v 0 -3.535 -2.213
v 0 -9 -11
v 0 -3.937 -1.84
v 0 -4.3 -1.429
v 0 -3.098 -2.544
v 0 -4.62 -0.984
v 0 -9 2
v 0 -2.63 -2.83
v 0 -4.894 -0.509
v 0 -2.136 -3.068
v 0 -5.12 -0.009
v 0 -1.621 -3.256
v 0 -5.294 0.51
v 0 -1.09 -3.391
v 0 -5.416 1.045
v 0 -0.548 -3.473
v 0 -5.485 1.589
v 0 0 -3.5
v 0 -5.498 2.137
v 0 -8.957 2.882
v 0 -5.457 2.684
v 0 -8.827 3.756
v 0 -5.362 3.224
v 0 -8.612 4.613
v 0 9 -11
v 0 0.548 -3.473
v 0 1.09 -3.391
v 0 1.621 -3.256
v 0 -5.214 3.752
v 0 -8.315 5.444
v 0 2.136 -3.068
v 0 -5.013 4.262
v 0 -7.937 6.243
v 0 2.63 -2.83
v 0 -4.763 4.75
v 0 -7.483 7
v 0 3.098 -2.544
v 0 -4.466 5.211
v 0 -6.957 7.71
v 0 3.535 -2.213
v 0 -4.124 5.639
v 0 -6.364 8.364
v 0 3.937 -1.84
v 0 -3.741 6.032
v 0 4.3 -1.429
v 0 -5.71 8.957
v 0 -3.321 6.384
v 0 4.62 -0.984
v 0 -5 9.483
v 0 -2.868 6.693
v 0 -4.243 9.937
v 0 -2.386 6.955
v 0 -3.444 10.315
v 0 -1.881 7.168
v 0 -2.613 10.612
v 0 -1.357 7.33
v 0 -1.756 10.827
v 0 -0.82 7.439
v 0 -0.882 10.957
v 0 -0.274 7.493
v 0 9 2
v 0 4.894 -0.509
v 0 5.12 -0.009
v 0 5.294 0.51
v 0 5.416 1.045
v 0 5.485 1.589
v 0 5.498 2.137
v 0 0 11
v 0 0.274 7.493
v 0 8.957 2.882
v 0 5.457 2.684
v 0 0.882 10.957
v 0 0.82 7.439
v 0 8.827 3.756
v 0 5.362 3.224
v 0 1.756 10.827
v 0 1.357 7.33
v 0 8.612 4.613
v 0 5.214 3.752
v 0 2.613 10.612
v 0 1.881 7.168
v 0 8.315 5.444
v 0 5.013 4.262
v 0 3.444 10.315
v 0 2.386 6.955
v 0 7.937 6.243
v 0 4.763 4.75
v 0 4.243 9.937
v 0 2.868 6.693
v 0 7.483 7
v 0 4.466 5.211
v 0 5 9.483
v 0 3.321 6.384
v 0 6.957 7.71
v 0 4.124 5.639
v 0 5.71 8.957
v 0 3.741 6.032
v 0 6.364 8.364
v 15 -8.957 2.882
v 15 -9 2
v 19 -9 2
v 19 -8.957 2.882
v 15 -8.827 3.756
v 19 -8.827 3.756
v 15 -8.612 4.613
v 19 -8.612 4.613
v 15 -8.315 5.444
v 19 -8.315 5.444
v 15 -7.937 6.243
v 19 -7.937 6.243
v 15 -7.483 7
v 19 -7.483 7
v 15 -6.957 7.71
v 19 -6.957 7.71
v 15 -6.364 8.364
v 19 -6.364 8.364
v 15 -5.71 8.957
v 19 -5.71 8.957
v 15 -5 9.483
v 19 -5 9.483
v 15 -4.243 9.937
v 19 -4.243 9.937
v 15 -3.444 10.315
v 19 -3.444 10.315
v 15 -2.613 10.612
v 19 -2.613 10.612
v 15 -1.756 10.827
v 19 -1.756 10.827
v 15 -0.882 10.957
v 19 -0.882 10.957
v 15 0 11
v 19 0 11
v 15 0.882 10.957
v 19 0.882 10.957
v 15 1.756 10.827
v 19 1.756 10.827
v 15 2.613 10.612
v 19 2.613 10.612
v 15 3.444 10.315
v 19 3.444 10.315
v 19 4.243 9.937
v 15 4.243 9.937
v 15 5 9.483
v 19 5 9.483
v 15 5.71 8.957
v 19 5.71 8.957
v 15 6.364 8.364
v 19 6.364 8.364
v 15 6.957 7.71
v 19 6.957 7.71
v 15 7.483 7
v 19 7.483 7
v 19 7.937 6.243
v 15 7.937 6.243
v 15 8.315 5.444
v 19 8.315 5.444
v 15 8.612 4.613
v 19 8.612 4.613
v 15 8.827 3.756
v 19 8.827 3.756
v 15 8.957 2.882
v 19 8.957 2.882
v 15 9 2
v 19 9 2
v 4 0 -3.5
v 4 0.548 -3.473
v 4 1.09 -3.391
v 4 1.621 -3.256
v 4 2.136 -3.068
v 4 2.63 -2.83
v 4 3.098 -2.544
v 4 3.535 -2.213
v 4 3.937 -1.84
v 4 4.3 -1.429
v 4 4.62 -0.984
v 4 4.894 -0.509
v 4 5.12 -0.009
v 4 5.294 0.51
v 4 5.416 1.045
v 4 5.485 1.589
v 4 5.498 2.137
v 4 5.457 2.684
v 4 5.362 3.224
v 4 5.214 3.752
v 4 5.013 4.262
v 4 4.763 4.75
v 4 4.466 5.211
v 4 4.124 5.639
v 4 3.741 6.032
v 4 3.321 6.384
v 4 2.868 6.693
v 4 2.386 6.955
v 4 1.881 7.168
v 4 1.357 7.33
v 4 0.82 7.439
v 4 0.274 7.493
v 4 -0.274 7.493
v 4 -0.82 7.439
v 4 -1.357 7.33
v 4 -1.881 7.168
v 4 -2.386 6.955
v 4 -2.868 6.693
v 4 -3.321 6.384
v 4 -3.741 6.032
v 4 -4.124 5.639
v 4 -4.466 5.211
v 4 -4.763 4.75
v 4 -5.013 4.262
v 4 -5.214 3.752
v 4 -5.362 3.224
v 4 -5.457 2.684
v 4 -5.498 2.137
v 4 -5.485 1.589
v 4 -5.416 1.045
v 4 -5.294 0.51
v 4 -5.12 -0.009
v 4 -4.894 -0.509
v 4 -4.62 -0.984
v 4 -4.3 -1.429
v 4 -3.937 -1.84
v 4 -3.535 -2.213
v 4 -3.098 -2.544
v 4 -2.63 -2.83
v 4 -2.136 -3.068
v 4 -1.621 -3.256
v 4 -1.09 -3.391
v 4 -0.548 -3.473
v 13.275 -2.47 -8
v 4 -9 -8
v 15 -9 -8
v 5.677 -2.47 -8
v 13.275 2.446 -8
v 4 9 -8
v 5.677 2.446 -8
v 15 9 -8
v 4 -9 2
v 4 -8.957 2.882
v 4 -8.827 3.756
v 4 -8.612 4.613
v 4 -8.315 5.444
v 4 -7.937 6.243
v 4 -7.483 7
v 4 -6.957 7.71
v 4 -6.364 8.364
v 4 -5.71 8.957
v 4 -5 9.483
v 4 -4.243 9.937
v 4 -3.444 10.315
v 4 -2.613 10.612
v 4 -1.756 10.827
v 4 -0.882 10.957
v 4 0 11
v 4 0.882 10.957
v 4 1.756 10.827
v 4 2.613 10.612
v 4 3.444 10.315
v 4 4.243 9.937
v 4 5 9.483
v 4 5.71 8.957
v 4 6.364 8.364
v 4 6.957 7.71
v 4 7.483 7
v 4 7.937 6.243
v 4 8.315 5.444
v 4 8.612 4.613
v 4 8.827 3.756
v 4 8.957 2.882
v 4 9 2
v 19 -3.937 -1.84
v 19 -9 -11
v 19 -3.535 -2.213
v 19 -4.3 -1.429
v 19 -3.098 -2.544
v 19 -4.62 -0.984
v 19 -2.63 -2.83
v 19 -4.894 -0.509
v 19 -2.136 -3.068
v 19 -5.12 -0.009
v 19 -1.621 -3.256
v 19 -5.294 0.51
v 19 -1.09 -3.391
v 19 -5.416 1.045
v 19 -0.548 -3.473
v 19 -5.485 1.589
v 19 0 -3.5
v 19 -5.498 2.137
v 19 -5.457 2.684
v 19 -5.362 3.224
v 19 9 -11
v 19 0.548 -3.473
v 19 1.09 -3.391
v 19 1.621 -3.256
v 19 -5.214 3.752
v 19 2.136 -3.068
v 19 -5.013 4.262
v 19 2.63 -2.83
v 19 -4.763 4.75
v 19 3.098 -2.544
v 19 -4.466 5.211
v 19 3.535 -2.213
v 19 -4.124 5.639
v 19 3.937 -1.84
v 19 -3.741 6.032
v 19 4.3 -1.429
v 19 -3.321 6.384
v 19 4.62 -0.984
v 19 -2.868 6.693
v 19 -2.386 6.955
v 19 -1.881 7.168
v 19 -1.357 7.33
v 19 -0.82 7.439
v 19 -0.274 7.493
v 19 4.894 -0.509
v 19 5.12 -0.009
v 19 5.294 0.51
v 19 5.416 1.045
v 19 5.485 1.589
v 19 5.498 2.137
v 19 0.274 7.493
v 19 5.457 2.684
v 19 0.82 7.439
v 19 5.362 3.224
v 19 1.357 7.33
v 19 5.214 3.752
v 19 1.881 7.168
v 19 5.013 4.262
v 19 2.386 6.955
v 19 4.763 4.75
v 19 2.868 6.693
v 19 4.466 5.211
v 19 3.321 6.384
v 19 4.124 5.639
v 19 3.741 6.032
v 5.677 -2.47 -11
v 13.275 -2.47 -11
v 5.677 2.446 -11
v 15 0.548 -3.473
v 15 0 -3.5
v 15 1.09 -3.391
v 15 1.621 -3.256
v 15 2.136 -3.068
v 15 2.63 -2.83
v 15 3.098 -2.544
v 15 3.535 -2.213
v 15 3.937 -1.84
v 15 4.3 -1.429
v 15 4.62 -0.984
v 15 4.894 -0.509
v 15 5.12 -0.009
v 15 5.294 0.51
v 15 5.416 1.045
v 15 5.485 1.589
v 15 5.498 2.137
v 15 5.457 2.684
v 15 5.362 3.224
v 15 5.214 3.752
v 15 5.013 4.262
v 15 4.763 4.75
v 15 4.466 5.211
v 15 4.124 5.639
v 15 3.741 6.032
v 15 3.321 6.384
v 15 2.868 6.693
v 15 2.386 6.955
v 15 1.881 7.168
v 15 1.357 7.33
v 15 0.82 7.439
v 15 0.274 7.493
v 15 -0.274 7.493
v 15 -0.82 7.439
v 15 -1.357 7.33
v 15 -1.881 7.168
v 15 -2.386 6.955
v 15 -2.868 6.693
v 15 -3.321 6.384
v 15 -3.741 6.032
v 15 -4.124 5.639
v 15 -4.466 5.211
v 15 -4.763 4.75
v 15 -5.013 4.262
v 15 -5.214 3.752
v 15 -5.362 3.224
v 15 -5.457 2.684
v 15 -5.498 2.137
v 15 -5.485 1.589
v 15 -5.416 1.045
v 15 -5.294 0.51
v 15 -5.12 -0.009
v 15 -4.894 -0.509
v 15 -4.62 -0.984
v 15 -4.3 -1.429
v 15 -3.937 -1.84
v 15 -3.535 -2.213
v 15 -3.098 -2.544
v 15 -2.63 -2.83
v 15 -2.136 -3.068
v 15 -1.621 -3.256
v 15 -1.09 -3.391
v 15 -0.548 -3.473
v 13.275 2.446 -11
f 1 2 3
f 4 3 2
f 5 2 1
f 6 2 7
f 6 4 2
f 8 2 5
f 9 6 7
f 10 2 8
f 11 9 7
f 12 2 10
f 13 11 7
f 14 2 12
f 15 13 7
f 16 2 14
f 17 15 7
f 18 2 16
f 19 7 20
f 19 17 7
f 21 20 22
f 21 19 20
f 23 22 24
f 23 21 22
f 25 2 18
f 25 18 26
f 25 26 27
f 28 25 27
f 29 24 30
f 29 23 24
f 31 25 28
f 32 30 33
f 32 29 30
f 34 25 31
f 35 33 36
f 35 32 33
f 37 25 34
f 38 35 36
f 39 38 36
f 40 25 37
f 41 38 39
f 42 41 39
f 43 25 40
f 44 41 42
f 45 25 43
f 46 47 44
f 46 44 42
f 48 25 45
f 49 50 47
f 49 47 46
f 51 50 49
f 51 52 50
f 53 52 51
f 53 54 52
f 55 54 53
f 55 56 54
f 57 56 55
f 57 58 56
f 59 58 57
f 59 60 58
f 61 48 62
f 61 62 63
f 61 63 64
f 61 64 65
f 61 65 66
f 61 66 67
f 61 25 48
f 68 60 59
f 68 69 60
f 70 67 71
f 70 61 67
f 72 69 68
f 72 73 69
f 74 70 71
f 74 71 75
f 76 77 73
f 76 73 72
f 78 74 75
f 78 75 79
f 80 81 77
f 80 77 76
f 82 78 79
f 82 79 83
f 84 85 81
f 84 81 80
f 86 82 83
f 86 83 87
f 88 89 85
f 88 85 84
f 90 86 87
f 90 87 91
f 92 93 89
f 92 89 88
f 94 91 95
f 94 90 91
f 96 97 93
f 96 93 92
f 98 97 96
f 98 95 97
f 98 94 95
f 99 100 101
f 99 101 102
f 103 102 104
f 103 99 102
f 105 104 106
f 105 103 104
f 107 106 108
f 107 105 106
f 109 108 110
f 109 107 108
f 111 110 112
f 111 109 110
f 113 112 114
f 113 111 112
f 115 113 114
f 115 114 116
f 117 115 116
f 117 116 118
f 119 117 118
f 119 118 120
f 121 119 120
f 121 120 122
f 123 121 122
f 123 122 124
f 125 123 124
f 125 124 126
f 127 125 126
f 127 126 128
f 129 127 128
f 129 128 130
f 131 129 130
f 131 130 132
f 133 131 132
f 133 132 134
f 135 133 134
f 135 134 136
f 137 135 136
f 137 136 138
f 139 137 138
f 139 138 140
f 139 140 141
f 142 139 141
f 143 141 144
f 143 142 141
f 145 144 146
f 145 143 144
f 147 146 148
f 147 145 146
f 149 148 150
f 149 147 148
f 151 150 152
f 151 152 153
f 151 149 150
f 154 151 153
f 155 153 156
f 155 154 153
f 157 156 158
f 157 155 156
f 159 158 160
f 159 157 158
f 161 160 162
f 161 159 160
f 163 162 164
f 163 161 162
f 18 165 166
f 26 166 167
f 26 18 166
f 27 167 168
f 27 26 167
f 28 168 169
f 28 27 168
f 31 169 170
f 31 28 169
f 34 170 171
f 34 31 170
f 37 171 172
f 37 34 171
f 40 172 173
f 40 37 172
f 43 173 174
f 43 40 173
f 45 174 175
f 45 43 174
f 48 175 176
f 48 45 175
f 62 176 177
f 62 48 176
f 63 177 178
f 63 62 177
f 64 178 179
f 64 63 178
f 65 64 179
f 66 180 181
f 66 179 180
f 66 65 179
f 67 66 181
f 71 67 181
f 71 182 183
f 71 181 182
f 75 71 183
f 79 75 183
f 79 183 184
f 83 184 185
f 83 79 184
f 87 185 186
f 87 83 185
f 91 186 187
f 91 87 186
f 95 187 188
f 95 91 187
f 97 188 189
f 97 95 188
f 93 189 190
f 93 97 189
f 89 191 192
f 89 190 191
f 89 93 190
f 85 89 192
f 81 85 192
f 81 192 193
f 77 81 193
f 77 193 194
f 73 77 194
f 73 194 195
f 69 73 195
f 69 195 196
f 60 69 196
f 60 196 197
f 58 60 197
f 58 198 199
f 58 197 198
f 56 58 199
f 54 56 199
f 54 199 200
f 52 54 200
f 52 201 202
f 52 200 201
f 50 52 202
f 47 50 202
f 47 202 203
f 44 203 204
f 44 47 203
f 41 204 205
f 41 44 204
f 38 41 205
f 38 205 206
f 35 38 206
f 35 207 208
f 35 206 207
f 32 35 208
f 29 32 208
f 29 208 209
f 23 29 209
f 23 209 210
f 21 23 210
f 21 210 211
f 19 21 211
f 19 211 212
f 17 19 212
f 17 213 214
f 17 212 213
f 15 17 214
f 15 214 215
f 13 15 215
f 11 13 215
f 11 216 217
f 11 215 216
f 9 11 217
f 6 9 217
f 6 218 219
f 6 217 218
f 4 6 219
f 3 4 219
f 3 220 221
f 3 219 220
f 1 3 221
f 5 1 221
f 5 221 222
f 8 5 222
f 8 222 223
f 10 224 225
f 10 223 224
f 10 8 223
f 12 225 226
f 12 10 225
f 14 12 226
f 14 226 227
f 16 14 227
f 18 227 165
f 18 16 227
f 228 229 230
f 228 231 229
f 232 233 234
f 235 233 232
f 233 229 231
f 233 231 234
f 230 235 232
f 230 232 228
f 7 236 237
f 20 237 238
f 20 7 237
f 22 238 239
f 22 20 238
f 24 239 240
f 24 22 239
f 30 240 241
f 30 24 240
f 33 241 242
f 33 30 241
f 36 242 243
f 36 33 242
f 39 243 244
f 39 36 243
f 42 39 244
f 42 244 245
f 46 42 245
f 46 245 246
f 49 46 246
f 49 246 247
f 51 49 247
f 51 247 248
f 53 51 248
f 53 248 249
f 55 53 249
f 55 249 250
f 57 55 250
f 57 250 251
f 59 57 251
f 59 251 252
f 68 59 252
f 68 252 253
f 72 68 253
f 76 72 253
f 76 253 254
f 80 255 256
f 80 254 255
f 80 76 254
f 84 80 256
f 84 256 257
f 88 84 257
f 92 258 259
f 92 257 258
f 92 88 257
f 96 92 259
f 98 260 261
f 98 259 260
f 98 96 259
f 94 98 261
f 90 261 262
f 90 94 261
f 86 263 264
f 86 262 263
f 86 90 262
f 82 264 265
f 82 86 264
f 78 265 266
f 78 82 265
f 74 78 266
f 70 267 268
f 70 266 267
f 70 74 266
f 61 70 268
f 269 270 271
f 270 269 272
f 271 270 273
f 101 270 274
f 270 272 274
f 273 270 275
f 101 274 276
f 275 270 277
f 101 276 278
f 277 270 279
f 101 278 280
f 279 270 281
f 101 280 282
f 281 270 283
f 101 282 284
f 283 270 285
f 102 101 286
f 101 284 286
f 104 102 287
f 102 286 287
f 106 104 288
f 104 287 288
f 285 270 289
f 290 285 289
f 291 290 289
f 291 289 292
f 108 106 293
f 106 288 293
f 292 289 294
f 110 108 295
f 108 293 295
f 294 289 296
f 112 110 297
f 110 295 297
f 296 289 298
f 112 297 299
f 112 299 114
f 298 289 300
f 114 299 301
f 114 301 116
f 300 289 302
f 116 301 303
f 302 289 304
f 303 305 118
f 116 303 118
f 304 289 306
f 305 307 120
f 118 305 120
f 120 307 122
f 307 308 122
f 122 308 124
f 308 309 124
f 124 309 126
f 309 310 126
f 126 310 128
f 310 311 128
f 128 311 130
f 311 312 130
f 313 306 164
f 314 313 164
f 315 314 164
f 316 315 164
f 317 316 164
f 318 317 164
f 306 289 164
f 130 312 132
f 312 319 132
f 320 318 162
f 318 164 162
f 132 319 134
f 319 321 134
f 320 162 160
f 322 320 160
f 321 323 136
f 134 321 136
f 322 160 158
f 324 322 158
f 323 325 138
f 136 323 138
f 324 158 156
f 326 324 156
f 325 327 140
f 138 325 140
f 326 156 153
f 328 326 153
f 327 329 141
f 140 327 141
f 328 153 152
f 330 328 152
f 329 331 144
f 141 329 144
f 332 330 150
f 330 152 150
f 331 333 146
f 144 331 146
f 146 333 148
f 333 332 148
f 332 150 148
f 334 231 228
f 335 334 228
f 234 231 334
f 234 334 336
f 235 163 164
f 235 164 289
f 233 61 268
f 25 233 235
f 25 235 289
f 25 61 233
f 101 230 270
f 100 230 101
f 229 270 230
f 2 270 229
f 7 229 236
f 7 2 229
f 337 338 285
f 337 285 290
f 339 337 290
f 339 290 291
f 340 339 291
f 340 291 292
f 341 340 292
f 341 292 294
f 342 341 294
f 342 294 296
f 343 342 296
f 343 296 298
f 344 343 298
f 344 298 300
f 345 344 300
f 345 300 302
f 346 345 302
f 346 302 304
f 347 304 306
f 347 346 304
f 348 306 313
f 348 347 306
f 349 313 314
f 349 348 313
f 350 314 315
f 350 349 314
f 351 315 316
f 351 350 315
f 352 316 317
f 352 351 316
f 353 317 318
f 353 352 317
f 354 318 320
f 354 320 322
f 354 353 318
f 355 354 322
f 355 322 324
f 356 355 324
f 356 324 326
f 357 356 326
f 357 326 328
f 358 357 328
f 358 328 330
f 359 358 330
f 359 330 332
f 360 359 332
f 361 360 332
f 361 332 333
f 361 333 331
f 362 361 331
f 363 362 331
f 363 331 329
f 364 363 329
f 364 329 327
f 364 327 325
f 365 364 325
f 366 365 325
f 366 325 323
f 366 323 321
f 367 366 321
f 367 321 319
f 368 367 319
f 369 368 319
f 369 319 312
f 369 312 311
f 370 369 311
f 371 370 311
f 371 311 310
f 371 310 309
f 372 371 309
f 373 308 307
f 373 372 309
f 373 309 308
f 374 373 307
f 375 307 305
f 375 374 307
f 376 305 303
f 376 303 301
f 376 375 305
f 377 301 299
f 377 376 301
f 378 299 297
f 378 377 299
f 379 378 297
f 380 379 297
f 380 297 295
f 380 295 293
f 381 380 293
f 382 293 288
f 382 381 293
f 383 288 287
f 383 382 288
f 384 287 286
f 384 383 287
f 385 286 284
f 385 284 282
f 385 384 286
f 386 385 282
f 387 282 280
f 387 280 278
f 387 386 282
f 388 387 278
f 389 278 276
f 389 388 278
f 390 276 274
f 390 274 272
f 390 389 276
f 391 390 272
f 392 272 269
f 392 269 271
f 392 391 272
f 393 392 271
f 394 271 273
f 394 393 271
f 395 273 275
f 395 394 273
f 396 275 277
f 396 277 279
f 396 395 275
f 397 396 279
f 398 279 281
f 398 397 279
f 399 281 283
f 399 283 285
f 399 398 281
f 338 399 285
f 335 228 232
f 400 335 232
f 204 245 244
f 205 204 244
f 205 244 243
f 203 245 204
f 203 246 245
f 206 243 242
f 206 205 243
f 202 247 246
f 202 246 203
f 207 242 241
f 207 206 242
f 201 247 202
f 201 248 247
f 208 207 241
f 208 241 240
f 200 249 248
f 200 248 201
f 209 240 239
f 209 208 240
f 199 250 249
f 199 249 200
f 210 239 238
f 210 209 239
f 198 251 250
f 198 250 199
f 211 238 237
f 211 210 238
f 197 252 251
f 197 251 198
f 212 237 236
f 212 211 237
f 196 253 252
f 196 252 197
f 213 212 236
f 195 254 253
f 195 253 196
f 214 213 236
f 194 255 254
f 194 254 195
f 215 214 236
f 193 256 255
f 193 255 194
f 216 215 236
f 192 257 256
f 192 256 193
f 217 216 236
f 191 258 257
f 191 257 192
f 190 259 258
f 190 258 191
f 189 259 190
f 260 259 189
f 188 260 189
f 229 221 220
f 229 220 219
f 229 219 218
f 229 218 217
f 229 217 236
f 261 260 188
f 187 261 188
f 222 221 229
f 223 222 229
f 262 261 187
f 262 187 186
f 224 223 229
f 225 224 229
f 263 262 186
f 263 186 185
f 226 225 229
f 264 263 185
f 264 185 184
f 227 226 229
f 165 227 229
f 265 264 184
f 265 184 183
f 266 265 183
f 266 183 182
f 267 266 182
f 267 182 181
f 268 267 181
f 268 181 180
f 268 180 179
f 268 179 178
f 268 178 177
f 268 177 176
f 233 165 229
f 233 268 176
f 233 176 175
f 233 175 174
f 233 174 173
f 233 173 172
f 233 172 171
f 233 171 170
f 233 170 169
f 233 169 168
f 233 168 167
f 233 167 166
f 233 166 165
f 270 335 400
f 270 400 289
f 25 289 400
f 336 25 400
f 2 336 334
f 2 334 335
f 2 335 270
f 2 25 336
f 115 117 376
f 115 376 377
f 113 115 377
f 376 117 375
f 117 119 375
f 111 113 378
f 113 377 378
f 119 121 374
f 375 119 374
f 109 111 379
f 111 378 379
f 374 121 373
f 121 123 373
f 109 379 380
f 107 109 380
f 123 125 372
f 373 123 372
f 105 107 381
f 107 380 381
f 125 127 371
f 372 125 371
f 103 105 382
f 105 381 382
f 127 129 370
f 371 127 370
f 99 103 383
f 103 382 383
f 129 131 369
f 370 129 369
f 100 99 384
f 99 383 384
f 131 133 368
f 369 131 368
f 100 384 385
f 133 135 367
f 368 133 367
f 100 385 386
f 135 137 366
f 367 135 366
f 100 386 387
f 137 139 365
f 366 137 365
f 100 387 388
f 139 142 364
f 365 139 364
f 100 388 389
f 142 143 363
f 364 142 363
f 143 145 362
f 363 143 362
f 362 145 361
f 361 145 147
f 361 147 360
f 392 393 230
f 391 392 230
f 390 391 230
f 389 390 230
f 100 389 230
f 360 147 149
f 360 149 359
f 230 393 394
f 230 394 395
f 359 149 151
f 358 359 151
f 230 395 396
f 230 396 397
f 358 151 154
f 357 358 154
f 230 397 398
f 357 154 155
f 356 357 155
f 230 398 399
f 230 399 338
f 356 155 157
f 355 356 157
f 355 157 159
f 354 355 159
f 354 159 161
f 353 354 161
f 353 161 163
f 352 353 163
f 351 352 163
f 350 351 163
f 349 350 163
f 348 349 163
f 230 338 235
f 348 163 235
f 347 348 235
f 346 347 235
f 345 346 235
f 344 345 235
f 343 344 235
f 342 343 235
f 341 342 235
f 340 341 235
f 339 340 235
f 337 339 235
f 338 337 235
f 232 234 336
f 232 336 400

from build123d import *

# Parameters (mm, degrees)
SKETCH1_R           = 5.499999036
BOSS_EXTRUDE1_DEPTH = 19
SKETCH2_W           = 11
SKETCH2_H           = 19
CUT_EXTRUDE1_DEPTH  = 33
SKETCH3_W           = 7.598245287
SKETCH3_H           = 4.916511656
CUT_EXTRUDE2_DEPTH  = 33


with BuildPart() as part:
    # Sketch1 → Boss-Extrude1 (new body)
    with BuildSketch(Plane(origin=(0, 0, 0), x_dir=(0, 0, -1), z_dir=(1, 0, 0))):
        with BuildLine():
            Line((-1.999999523, 9.000000954), (11.000000477, 9.000000954))
            Line((11.000000477, 9.000000954), (11.000000477, -9.000000954))
            Line((11.000000477, -9.000000954), (-1.999999523, -9.000000954))
            ThreePointArc((-1.999999523, -9.000000954), (-11.000000477, 0), (-1.999999523, 9.000000954))
        make_face()
        with Locations((-1.999999523, 0)):
            Circle(SKETCH1_R, mode=Mode.SUBTRACT)
    extrude(amount=BOSS_EXTRUDE1_DEPTH)

    # Sketch2 → Cut-Extrude1 (cut)
    with BuildSketch(Plane(origin=(0, 9.000000954, 0), x_dir=(1, 0, 0), z_dir=(0, 1, 0))):
        with Locations((9.5, -1.500000477)):
            Rectangle(SKETCH2_W, SKETCH2_H)
    extrude(amount=-CUT_EXTRUDE1_DEPTH, mode=Mode.SUBTRACT)

    # Sketch3 → Cut-Extrude2 (cut)
    with BuildSketch(Plane.XY.offset(-7.999999523)):
        with Locations((9.476309149, -0.011845426)):
            Rectangle(SKETCH3_W, SKETCH3_H)
    extrude(amount=-CUT_EXTRUDE2_DEPTH, mode=Mode.SUBTRACT)


solid = part.part
